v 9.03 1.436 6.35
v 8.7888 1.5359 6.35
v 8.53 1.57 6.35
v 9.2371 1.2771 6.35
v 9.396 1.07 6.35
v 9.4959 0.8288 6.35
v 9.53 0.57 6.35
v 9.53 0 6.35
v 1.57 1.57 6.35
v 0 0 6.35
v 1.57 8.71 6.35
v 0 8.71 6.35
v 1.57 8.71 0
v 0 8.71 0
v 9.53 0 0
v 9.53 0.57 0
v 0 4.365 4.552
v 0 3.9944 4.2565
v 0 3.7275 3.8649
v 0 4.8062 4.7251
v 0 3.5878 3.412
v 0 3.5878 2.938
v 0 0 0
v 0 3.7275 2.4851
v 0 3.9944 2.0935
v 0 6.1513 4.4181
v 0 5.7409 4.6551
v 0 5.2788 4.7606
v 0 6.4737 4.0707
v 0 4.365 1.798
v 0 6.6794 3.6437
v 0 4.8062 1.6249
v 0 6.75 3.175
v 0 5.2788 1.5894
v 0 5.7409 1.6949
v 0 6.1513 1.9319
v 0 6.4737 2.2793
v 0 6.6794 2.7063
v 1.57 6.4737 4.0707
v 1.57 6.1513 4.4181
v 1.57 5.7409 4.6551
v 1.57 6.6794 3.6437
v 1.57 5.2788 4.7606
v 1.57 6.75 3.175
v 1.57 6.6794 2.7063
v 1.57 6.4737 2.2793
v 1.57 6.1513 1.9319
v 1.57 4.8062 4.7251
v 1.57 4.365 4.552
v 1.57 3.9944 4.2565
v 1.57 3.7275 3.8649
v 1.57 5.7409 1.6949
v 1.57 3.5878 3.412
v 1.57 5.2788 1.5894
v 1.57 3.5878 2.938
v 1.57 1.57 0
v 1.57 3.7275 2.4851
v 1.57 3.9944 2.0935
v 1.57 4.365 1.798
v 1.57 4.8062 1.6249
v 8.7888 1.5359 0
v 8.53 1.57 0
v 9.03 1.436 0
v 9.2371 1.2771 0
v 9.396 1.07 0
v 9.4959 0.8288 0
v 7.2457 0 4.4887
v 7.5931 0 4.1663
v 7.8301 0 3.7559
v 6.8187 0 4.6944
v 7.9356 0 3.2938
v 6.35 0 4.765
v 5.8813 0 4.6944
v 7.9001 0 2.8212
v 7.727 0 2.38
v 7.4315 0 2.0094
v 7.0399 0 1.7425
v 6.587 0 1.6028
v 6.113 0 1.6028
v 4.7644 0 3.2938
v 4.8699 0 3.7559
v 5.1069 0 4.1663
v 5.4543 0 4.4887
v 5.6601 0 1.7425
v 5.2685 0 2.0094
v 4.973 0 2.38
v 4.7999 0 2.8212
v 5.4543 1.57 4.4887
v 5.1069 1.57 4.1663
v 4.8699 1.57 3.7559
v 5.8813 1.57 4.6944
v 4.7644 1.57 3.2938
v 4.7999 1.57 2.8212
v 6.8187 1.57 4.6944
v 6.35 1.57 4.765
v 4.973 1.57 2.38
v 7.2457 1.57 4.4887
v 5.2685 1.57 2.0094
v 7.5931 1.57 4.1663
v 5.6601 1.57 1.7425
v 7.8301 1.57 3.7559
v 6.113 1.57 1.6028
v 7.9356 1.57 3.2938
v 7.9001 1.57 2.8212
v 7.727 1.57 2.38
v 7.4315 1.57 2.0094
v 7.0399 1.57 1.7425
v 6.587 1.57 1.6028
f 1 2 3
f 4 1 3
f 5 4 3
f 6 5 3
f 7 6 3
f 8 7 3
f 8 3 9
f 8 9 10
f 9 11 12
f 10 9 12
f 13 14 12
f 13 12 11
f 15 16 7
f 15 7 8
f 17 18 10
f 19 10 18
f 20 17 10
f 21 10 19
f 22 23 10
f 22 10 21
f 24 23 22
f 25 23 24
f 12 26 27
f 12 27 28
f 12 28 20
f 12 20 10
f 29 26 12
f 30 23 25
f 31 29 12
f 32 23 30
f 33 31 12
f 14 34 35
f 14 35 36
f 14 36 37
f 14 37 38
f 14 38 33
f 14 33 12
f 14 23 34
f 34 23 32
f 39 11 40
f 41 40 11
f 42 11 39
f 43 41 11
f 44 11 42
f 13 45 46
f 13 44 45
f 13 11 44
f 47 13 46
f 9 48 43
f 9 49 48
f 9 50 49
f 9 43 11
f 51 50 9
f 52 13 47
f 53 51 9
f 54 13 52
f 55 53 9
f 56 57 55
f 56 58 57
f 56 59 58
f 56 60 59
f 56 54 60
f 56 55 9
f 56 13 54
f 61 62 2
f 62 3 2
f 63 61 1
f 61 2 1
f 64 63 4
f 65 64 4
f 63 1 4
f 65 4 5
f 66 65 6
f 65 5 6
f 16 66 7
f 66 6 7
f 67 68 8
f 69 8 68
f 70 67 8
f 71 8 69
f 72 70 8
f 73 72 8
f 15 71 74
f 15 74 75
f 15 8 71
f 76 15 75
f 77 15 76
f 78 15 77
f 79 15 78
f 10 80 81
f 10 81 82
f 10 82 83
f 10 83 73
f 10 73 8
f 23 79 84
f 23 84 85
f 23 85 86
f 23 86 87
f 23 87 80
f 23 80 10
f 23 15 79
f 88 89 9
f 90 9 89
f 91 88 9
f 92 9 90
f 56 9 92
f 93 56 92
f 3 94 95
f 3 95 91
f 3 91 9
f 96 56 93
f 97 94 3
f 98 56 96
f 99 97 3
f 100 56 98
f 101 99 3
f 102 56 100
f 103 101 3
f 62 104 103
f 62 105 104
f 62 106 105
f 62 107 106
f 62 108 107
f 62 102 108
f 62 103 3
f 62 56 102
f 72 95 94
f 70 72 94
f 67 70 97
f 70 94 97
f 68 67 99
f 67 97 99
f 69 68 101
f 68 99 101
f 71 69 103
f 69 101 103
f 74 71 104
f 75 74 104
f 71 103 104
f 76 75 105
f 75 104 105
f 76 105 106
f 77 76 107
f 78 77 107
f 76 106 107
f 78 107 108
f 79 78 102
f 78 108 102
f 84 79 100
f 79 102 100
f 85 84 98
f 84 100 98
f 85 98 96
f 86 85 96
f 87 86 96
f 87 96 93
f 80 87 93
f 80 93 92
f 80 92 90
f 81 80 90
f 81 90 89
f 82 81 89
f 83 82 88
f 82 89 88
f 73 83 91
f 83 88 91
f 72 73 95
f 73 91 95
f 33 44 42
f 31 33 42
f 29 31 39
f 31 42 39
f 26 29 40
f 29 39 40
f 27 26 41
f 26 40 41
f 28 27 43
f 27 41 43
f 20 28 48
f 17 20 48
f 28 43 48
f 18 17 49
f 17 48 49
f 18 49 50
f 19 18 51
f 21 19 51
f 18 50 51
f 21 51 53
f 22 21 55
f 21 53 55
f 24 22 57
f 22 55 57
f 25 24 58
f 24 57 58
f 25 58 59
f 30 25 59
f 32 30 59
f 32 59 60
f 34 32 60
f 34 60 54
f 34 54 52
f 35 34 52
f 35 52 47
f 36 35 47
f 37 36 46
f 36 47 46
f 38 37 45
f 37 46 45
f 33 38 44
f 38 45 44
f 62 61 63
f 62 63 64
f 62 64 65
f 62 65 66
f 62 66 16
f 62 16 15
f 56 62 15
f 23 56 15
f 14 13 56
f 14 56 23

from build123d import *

# Parameters (mm, degrees)
BOSS_EXTRUDE1_DEPTH = 6.35
SKETCH2_R           = 1.59
CUT_EXTRUDE1_DEPTH  = 1.57
SKETCH3_R           = 1.59
CUT_EXTRUDE2_DEPTH  = 1.57
FILLET1_R           = 1


with BuildPart() as part:
    # Sketch1 → Boss-Extrude1 (new body)
    with BuildSketch(Plane.XY):
        Polygon((0, 8.71), (1.57, 8.71), (1.57, 1.57), (9.53, 1.57), (9.53, 0), (0, 0), align=None)
    extrude(amount=BOSS_EXTRUDE1_DEPTH)

    # Sketch2 → Cut-Extrude1 (cut)
    with BuildSketch(Plane(origin=(0, 1.57, 0), x_dir=(1, 0, 0), z_dir=(0, 1, 0))):
        with Locations(Location((6.35, -3.175, 0), (0, 0, 270))):
            Circle(SKETCH2_R)
    extrude(amount=-CUT_EXTRUDE1_DEPTH, mode=Mode.SUBTRACT)

    # Sketch3 → Cut-Extrude2 (cut)
    with BuildSketch(Plane(origin=(1.57, 0, 0), x_dir=(0, 0, -1), z_dir=(1, 0, 0))):
        with Locations(Location((-3.175, 5.16, 0), (0, 0, 90))):
            Circle(SKETCH3_R)
    extrude(amount=-CUT_EXTRUDE2_DEPTH, mode=Mode.SUBTRACT)

    # Fillet1
    fillet1_edges = [part.edges().sort_by_distance(p)[0] for p in [
        (9.53, 1.57, 3.175),
    ]]
    fillet(fillet1_edges, radius=FILLET1_R)


solid = part.part
